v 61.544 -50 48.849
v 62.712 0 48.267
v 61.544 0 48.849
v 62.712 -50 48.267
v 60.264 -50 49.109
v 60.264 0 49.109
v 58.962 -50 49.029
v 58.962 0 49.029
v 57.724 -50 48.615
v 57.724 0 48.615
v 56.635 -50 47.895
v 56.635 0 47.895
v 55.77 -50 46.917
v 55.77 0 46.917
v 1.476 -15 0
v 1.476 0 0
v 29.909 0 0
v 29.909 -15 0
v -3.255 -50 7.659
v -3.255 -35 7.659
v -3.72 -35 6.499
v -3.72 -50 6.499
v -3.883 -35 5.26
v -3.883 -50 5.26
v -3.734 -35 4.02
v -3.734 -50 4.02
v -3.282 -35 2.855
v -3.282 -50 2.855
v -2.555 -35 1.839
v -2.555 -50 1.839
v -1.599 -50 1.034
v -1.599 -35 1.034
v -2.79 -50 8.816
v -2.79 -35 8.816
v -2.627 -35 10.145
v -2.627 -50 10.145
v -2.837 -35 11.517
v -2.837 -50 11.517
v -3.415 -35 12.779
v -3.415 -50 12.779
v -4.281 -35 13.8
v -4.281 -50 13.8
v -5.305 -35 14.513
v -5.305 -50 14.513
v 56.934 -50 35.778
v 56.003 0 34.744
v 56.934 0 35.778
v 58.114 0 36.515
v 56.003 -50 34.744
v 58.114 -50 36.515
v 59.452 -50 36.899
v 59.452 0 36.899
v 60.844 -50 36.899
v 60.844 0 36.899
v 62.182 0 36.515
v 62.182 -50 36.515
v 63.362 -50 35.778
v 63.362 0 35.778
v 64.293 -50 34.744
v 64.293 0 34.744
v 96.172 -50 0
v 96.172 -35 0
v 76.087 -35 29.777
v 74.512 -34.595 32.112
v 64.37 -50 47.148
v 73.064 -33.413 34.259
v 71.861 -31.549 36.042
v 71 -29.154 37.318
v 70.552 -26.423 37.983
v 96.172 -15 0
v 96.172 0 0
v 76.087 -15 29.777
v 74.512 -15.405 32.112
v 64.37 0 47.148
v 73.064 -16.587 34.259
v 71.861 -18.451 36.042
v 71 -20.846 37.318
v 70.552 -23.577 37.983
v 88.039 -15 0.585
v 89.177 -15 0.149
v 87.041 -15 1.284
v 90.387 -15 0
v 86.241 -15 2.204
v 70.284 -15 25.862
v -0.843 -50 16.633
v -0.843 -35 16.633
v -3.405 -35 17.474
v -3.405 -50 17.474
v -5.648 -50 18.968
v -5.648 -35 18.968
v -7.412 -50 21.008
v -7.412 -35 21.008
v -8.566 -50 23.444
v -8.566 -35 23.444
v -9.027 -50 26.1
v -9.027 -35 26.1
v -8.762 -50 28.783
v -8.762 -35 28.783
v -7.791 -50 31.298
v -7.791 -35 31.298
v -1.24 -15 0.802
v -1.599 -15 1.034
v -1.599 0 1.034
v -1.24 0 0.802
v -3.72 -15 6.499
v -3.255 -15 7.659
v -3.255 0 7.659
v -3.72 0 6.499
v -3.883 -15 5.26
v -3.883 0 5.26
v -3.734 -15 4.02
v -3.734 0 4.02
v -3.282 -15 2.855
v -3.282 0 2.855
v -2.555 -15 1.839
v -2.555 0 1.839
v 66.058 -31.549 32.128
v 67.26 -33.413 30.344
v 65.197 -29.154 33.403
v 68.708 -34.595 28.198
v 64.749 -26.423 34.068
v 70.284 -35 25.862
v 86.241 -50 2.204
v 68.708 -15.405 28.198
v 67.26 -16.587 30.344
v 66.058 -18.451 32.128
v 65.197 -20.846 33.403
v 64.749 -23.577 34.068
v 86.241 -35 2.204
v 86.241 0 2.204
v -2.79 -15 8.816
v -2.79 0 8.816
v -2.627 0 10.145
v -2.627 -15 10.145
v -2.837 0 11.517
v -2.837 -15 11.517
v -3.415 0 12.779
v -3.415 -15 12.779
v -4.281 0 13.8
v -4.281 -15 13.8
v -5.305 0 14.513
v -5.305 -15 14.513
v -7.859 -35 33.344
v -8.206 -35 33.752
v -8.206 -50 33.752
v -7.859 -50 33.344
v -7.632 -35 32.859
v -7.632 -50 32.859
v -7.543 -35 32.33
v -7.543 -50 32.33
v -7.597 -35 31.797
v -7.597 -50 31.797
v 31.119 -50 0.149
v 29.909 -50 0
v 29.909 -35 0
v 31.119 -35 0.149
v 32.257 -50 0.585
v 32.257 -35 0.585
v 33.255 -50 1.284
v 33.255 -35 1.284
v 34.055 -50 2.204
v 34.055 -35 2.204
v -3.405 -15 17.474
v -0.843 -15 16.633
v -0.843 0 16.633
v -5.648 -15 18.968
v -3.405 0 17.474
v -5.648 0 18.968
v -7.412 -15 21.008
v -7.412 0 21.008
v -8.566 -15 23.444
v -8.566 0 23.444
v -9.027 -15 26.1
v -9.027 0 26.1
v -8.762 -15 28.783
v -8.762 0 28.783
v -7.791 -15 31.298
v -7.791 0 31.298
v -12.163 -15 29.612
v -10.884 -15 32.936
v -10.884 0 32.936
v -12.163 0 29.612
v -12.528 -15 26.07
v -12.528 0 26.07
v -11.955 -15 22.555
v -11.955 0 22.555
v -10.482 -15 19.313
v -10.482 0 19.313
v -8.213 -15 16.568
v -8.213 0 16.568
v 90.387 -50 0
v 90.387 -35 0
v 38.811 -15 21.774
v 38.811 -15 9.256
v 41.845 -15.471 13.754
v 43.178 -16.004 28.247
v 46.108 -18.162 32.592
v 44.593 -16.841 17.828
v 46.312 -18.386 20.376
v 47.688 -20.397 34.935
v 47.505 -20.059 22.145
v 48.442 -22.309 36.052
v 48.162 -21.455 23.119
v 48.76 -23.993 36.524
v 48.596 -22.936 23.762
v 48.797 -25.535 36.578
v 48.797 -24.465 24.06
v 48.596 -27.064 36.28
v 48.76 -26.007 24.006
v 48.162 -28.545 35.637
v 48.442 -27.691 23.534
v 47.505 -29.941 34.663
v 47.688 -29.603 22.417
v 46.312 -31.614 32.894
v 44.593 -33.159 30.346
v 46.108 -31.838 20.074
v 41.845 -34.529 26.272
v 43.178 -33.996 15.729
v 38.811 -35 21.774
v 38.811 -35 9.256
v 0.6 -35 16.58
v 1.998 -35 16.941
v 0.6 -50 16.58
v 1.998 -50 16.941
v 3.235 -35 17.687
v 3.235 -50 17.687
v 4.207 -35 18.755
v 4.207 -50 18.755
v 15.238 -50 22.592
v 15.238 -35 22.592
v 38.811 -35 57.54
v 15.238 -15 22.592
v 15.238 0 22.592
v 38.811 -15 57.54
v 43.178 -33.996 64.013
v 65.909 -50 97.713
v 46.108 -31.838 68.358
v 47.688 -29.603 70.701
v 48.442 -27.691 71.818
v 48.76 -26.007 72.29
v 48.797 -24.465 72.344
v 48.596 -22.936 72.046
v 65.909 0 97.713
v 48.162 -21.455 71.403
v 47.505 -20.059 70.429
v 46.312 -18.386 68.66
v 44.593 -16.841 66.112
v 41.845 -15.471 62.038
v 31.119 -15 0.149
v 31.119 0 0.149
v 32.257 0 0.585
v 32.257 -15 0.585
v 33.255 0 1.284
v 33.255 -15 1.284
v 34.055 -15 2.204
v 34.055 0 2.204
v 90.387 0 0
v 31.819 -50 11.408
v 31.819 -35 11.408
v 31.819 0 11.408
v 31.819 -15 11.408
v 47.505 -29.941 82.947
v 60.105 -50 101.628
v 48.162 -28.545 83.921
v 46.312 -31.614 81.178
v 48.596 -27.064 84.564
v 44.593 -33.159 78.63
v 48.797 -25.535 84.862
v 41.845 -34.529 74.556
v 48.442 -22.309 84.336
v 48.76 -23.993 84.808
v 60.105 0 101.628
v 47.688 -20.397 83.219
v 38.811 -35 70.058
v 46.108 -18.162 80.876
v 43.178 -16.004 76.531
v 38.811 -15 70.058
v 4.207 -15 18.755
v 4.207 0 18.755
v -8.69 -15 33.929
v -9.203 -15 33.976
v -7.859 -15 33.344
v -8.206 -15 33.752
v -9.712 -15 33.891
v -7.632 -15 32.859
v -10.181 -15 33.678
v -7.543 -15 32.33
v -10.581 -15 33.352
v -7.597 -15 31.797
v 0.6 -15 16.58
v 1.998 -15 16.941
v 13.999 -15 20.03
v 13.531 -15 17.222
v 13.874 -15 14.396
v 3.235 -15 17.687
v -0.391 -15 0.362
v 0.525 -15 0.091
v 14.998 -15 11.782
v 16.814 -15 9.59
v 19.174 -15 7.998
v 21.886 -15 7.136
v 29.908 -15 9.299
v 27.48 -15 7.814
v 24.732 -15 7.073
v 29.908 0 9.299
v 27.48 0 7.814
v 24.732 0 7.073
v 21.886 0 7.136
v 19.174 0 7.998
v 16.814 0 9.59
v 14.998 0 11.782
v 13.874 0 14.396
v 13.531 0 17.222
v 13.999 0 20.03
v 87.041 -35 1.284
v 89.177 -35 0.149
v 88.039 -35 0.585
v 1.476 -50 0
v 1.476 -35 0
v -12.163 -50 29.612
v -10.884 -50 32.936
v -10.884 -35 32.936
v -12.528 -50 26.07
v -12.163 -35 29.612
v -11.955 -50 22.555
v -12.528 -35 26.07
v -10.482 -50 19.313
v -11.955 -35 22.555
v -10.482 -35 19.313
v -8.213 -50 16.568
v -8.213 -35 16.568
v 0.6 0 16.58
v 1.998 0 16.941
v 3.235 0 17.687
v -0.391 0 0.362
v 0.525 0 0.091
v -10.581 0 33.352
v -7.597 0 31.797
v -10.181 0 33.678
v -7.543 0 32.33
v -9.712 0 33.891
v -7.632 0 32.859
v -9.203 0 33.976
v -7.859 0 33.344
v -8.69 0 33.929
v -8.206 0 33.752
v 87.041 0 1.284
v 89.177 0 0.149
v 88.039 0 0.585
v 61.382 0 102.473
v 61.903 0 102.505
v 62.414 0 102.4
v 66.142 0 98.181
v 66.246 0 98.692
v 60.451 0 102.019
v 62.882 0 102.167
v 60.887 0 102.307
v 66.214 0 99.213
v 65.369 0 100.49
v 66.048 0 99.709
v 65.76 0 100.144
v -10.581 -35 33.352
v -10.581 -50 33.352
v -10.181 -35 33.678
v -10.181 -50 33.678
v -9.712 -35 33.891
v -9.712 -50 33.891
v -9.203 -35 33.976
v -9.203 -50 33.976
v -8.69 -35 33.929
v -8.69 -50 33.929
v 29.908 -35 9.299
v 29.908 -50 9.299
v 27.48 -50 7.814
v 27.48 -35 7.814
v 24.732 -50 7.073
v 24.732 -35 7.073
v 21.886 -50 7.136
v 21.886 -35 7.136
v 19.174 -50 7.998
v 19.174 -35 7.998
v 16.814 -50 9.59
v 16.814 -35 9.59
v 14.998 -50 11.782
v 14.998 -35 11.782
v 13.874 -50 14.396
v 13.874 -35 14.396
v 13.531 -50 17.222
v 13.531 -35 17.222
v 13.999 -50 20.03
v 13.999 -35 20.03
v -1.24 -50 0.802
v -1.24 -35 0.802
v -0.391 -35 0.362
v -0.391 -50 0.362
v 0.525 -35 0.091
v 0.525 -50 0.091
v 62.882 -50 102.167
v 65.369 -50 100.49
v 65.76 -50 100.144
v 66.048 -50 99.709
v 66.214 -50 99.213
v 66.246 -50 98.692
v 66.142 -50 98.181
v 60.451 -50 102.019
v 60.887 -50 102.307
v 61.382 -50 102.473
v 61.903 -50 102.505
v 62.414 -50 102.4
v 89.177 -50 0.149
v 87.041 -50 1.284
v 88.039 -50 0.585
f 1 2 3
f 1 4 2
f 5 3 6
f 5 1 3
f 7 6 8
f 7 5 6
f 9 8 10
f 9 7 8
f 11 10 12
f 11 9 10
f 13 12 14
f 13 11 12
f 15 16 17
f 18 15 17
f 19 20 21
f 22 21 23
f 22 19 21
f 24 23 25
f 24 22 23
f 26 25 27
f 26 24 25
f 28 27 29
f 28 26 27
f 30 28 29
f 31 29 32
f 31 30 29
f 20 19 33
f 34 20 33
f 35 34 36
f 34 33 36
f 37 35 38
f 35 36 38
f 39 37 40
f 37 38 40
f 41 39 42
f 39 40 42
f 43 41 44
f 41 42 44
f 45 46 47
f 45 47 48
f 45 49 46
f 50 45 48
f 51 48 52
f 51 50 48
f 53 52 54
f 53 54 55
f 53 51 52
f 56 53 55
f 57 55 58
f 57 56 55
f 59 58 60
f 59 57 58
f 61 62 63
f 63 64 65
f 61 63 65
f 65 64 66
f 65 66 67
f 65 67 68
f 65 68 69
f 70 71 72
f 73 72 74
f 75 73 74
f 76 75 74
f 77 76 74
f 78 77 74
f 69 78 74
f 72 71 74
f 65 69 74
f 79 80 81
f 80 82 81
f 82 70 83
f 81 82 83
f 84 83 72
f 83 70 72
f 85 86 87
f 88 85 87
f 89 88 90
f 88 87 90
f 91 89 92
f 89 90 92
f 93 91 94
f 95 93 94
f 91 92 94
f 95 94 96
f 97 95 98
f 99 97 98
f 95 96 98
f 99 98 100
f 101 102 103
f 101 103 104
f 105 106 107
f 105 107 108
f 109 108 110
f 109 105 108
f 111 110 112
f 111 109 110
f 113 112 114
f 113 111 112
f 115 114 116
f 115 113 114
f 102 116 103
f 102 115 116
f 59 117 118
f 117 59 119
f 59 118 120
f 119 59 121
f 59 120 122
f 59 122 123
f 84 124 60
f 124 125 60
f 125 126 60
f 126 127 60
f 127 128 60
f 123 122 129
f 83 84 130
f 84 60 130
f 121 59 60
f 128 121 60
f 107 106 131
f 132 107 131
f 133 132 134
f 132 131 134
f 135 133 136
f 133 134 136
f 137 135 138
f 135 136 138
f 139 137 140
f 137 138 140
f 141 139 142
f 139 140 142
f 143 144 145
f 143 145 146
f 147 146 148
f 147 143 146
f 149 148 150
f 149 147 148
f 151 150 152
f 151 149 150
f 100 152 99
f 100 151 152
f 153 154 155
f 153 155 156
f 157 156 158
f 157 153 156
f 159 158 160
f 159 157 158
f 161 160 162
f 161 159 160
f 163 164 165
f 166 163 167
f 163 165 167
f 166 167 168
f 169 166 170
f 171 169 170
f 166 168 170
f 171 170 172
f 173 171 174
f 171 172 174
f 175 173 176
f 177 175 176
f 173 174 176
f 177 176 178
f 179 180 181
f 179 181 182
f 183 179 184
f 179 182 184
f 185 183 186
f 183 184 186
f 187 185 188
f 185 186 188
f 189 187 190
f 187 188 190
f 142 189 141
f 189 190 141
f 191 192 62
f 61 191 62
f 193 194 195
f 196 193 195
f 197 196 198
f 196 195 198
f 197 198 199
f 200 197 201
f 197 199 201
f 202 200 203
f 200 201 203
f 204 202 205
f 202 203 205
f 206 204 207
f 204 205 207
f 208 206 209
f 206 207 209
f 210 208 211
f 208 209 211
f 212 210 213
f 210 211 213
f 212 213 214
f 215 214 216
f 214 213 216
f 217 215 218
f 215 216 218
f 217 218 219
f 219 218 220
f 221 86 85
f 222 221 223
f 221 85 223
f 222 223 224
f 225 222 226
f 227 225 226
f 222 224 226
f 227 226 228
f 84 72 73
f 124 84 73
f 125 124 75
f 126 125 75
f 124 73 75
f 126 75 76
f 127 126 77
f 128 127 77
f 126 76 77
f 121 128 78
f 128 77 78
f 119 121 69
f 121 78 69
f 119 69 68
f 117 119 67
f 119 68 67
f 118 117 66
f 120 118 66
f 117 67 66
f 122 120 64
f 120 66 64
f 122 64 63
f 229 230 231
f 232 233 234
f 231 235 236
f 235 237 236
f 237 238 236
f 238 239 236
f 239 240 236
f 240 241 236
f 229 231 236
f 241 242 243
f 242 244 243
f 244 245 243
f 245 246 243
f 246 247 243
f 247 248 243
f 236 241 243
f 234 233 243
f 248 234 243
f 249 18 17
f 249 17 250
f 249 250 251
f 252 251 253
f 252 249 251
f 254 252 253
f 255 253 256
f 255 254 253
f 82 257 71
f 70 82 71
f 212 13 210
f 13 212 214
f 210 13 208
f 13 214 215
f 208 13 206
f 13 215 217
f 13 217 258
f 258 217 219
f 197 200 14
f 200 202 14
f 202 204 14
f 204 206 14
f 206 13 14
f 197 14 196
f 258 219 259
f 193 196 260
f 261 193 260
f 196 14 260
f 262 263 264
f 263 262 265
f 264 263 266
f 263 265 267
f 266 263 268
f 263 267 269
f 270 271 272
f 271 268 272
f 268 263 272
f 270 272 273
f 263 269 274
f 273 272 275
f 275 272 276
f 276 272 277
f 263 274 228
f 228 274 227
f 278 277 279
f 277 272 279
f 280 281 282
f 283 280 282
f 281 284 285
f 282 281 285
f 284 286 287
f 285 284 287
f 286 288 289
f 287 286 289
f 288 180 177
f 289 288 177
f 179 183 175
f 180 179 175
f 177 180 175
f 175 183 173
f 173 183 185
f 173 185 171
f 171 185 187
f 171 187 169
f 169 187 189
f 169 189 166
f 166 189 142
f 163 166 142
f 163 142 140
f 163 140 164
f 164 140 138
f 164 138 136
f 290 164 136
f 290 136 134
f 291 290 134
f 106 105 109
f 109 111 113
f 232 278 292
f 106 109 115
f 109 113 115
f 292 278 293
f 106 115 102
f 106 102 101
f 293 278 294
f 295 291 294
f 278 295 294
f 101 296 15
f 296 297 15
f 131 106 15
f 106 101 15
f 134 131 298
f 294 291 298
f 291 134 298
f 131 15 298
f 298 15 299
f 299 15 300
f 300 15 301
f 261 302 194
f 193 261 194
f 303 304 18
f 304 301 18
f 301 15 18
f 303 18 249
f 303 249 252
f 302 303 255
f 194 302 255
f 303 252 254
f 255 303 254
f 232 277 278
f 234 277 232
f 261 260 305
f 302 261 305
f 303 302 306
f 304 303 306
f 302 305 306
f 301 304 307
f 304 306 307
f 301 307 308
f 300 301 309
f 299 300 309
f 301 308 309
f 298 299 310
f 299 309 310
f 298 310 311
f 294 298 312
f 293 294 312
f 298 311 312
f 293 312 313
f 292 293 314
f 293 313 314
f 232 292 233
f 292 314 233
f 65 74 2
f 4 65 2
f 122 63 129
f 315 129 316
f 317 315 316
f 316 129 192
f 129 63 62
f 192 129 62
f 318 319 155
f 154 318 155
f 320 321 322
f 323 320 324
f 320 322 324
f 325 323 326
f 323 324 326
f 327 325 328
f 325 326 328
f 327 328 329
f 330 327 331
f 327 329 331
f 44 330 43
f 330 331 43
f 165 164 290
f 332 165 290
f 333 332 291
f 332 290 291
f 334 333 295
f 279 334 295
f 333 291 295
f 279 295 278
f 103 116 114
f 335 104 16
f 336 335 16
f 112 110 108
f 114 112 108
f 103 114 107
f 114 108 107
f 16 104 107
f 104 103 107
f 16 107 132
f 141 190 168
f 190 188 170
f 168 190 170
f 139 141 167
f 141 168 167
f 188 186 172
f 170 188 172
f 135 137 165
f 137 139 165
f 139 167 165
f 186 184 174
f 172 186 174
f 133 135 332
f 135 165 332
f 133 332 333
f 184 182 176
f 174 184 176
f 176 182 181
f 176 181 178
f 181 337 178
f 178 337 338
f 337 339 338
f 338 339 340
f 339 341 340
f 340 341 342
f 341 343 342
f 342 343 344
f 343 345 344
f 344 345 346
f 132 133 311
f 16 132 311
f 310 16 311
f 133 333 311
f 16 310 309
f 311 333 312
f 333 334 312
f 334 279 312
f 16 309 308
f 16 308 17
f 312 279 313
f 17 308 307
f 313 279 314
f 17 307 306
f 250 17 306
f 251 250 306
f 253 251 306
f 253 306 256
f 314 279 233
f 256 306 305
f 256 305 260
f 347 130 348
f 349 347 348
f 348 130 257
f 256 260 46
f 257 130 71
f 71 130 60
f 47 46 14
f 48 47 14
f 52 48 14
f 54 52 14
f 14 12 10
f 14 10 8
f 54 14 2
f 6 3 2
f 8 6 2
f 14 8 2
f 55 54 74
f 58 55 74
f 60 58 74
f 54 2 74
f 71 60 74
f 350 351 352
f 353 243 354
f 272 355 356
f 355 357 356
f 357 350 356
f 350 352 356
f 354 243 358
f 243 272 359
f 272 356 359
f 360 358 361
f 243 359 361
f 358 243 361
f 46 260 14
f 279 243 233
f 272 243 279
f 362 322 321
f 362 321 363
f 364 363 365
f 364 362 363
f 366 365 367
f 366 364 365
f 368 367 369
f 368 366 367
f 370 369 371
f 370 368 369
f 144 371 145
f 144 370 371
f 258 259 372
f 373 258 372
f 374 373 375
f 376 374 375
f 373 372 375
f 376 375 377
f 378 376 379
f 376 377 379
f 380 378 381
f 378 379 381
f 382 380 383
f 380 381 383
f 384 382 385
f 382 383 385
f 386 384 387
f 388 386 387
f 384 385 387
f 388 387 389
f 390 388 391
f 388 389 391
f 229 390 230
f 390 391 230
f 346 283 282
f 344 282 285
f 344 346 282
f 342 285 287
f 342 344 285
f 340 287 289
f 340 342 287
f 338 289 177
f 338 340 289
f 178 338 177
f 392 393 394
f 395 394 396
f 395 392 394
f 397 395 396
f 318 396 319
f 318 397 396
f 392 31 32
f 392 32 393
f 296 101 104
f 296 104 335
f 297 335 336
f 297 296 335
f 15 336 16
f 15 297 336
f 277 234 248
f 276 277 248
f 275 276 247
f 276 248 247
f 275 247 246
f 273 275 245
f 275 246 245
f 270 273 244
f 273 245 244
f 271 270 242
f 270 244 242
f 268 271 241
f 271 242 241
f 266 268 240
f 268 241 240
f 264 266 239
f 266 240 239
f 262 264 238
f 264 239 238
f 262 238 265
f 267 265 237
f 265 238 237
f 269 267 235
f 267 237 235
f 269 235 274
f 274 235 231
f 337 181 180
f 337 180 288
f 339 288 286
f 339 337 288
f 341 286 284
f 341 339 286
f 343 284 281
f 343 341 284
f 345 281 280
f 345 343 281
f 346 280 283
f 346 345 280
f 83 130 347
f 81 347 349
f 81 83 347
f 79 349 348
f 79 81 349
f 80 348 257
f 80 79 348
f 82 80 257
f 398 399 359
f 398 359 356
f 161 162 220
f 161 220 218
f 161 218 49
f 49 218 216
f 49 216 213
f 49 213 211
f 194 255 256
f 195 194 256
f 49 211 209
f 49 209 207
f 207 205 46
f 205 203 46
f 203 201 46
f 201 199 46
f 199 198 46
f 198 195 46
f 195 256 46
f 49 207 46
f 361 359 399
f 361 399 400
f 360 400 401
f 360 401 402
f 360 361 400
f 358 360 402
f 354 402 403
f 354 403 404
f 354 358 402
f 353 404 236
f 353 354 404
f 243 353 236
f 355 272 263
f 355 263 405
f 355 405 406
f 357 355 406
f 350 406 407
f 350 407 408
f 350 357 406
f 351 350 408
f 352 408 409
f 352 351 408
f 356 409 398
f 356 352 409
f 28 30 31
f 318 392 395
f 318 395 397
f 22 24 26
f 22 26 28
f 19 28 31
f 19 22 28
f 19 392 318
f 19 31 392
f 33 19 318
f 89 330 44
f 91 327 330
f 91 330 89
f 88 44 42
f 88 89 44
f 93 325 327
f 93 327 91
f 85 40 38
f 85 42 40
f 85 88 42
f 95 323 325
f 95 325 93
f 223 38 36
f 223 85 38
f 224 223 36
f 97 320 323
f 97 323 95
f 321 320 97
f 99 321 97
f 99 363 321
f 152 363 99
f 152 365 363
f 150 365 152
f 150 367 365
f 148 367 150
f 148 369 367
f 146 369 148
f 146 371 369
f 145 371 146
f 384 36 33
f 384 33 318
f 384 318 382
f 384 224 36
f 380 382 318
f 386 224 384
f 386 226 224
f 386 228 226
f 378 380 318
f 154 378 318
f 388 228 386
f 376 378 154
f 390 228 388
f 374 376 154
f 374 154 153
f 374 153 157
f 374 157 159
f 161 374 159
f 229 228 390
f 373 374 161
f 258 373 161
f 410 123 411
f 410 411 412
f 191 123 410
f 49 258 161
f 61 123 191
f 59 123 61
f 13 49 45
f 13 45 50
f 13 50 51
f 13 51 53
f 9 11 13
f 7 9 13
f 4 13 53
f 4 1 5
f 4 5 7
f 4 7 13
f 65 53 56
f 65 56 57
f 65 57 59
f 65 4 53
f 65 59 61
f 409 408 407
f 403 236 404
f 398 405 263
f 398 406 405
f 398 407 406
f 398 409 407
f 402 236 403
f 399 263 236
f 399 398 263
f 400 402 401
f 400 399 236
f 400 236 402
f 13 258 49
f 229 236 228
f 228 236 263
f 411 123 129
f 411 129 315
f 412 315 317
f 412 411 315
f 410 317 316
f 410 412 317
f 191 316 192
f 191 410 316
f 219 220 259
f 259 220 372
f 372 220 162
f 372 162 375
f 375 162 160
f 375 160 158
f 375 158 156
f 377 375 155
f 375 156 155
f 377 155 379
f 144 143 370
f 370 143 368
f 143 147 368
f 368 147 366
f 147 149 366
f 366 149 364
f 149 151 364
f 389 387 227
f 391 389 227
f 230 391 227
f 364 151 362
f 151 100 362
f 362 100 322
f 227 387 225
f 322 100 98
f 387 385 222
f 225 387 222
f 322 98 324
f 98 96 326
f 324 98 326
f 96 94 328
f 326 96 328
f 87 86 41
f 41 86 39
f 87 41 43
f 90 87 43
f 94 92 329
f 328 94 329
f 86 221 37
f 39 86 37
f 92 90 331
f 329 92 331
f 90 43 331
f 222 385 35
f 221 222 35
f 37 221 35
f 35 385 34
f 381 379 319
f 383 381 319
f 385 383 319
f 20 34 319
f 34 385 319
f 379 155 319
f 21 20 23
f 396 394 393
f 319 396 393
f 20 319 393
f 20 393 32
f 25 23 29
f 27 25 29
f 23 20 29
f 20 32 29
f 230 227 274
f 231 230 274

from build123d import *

# Parameters (mm, degrees)
F1_DEPTH    = 50
F2_R        = 5
F3_T1_DEPTH = 61.0584684806
F3_T3_DEPTH = 59.847165152
F3_T5_DEPTH = 60
F4_R        = 5
F5_W        = 35.3398231359
F5_H        = 20
F5_W_2      = 28.4329991749
F6_DEPTH    = 102.5
F8_DEPTH    = 25


# Not quite as in the source:
# - a fillet or chamfer that OpenCascade refuses, or shapes differently, is made with other operations: its cross-section is extruded or revolved along the edge and cut away or added


with BuildPart() as f1:
    # F0 (on Front) → F1 (new body)
    with BuildSketch(Plane.XZ):
        with BuildLine():
            ThreePointArc((31.8191999969, 11.4080709653), (17.9368952367, 8.7096242744), (15.2384485458, 22.5919290347))
            Line((15.2384485458, 22.5919290347), (67.0269365518, 99.3715199707))
            Line((67.0269365518, 99.3715199707), (61.2236735439, 103.285870295))
            Line((61.2236735439, 103.285870295), (2.7757529523, 16.6332645351))
            ThreePointArc((2.7757529523, 16.6332645351), (-7.6399843, 21.3751609063), (-6.7842885115, 32.7874765531))
            Line((-6.7842885115, 32.7874765531), (-9.6689994545, 34.7836766193))
            ThreePointArc((-9.6689994545, 34.7836766193), (-11.3082346995, 20.8471863165), (0.3142037122, 12.9838677097))
            Line((0.3142037122, 12.9838677097), (-5.8783996854, 3.8029556189))
            Line((-5.8783996854, 3.8029556189), (0, 0))
            Line((0, 0), (32.5678846096, 0))
            Line((32.5678846096, 0), (60.1479586957, 40.8891413488))
            Line((60.1479586957, 40.8891413488), (87.7280327819, 0))
            Line((87.7280327819, 0), (96.1715584214, 0))
            Line((96.1715584214, 0), (64.3697215155, 47.1481621237))
            Line((64.3697215155, 47.1481621237), (58.5664585076, 51.062512448))
            Line((58.5664585076, 51.062512448), (31.8191999969, 11.4080709653))
        make_face()
    extrude(amount=F1_DEPTH)

    # F2
    f2_edges = [f1.edges().sort_by_distance(p)[0] for p in [
        (58.566459, -25, 51.062512),
        (60.147959, -25, 40.889141),
        (32.567885, -25, 0),
        (87.728033, -25, 0),
        (0, -25, 0),
        (-5.8784, -25, 3.802956),
    ]]
    fillet(f2_edges, radius=F2_R)

    # F3: fillet of radius 2 on 4 edges, made by hand

    # F3_s2 → F3_t1 (cut)
    with BuildSketch(Plane.XZ.offset(-5.5292342403)):
        with BuildLine():
            ThreePointArc((-10.8840299501, 32.9356263223), (-9.5901444427, 33.9234656813), (-7.9904107365, 33.6221048098))
            Line((-7.9904107365, 33.6221048098), (-9.6689994545, 34.7836766193))
            ThreePointArc((-9.6689994545, 34.7836766193), (-10.3144239688, 33.8845755298), (-10.8840299501, 32.9356263223))
        make_face()
    extrude(amount=F3_T1_DEPTH, mode=Mode.SUBTRACT)

    # F3_s4 → F3_t3 (cut)
    with BuildSketch(Plane.XZ.offset(-4.923582576)):
        with BuildLine():
            ThreePointArc((-8.4037793712, 33.9081530525), (-7.5948464442, 32.7208873787), (-7.790553617, 31.2976266988))
            ThreePointArc((-7.790553617, 31.2976266988), (-7.3209703374, 32.065211267), (-6.7842885115, 32.7874765531))
            Line((-6.7842885115, 32.7874765531), (-8.4037793712, 33.9081530525))
        make_face()
    extrude(amount=F3_T3_DEPTH, mode=Mode.SUBTRACT)

    # F3_s6 → F3_t5 (cut)
    with BuildSketch(Plane.XZ.offset(-5)):
        with BuildLine():
            ThreePointArc((60.105287737, 101.6277951499), (61.3817448913, 102.4726637098), (62.881748689, 102.1674844881))
            Line((62.881748689, 102.1674844881), (61.2236735439, 103.285870295))
            Line((61.2236735439, 103.285870295), (60.105287737, 101.6277951499))
        make_face()
        with BuildLine():
            ThreePointArc((65.3688614067, 100.4899057776), (66.2137299667, 99.2134486233), (65.9085507449, 97.7134448256))
            Line((65.9085507449, 97.7134448256), (67.0269365518, 99.3715199707))
            Line((67.0269365518, 99.3715199707), (65.3688614067, 100.4899057776))
        make_face()
    extrude(amount=F3_T5_DEPTH, mode=Mode.SUBTRACT)

    # F4
    f4_edges = [f1.edges().sort_by_distance(p)[0] for p in [
        (2.775753, -25, 16.633265),
        (0.314204, -25, 12.983868),
    ]]
    fillet(f4_edges, radius=F4_R)

    # F5 (on face) → F6 (cut)
    with BuildSketch(Plane(origin=(0, 0, 0), x_dir=(1, 0, 0), z_dir=(0, 0, -1))):
        with Locations((-16.1935732915, 25)):
            Rectangle(F5_W, F5_H)
        with Locations((15.6928378639, 25)):
            Rectangle(F5_W_2, F5_H)
        with BuildLine():
            Line((29.9093374513, 15), (38.8109274209, 15))
            ThreePointArc((38.8109274209, 15), (48.8109274209, 25), (38.8109274209, 35))
            Line((38.8109274209, 35), (29.9093374513, 35))
            Line((29.9093374513, 35), (29.9093374513, 15))
        make_face()
    extrude(amount=-F6_DEPTH, mode=Mode.SUBTRACT)

    # F7 (on face) → F8 (cut)
    with BuildSketch(Plane(origin=(66.0990291526, 0, 44.5843581184), x_dir=(0, 1, 0), z_dir=(0.8290375726, 0, 0.5591929035))):
        with BuildLine():
            Line((-15, -53.778452985), (-15, -17.8613532335))
            ThreePointArc((-15, -17.8613532335), (-25, -7.8613532335), (-35, -17.8613532335))
            Line((-35, -17.8613532335), (-35, -53.778452985))
            Line((-35, -53.778452985), (-15, -53.778452985))
        make_face()
    extrude(amount=-F8_DEPTH, mode=Mode.SUBTRACT)


solid = f1.part
